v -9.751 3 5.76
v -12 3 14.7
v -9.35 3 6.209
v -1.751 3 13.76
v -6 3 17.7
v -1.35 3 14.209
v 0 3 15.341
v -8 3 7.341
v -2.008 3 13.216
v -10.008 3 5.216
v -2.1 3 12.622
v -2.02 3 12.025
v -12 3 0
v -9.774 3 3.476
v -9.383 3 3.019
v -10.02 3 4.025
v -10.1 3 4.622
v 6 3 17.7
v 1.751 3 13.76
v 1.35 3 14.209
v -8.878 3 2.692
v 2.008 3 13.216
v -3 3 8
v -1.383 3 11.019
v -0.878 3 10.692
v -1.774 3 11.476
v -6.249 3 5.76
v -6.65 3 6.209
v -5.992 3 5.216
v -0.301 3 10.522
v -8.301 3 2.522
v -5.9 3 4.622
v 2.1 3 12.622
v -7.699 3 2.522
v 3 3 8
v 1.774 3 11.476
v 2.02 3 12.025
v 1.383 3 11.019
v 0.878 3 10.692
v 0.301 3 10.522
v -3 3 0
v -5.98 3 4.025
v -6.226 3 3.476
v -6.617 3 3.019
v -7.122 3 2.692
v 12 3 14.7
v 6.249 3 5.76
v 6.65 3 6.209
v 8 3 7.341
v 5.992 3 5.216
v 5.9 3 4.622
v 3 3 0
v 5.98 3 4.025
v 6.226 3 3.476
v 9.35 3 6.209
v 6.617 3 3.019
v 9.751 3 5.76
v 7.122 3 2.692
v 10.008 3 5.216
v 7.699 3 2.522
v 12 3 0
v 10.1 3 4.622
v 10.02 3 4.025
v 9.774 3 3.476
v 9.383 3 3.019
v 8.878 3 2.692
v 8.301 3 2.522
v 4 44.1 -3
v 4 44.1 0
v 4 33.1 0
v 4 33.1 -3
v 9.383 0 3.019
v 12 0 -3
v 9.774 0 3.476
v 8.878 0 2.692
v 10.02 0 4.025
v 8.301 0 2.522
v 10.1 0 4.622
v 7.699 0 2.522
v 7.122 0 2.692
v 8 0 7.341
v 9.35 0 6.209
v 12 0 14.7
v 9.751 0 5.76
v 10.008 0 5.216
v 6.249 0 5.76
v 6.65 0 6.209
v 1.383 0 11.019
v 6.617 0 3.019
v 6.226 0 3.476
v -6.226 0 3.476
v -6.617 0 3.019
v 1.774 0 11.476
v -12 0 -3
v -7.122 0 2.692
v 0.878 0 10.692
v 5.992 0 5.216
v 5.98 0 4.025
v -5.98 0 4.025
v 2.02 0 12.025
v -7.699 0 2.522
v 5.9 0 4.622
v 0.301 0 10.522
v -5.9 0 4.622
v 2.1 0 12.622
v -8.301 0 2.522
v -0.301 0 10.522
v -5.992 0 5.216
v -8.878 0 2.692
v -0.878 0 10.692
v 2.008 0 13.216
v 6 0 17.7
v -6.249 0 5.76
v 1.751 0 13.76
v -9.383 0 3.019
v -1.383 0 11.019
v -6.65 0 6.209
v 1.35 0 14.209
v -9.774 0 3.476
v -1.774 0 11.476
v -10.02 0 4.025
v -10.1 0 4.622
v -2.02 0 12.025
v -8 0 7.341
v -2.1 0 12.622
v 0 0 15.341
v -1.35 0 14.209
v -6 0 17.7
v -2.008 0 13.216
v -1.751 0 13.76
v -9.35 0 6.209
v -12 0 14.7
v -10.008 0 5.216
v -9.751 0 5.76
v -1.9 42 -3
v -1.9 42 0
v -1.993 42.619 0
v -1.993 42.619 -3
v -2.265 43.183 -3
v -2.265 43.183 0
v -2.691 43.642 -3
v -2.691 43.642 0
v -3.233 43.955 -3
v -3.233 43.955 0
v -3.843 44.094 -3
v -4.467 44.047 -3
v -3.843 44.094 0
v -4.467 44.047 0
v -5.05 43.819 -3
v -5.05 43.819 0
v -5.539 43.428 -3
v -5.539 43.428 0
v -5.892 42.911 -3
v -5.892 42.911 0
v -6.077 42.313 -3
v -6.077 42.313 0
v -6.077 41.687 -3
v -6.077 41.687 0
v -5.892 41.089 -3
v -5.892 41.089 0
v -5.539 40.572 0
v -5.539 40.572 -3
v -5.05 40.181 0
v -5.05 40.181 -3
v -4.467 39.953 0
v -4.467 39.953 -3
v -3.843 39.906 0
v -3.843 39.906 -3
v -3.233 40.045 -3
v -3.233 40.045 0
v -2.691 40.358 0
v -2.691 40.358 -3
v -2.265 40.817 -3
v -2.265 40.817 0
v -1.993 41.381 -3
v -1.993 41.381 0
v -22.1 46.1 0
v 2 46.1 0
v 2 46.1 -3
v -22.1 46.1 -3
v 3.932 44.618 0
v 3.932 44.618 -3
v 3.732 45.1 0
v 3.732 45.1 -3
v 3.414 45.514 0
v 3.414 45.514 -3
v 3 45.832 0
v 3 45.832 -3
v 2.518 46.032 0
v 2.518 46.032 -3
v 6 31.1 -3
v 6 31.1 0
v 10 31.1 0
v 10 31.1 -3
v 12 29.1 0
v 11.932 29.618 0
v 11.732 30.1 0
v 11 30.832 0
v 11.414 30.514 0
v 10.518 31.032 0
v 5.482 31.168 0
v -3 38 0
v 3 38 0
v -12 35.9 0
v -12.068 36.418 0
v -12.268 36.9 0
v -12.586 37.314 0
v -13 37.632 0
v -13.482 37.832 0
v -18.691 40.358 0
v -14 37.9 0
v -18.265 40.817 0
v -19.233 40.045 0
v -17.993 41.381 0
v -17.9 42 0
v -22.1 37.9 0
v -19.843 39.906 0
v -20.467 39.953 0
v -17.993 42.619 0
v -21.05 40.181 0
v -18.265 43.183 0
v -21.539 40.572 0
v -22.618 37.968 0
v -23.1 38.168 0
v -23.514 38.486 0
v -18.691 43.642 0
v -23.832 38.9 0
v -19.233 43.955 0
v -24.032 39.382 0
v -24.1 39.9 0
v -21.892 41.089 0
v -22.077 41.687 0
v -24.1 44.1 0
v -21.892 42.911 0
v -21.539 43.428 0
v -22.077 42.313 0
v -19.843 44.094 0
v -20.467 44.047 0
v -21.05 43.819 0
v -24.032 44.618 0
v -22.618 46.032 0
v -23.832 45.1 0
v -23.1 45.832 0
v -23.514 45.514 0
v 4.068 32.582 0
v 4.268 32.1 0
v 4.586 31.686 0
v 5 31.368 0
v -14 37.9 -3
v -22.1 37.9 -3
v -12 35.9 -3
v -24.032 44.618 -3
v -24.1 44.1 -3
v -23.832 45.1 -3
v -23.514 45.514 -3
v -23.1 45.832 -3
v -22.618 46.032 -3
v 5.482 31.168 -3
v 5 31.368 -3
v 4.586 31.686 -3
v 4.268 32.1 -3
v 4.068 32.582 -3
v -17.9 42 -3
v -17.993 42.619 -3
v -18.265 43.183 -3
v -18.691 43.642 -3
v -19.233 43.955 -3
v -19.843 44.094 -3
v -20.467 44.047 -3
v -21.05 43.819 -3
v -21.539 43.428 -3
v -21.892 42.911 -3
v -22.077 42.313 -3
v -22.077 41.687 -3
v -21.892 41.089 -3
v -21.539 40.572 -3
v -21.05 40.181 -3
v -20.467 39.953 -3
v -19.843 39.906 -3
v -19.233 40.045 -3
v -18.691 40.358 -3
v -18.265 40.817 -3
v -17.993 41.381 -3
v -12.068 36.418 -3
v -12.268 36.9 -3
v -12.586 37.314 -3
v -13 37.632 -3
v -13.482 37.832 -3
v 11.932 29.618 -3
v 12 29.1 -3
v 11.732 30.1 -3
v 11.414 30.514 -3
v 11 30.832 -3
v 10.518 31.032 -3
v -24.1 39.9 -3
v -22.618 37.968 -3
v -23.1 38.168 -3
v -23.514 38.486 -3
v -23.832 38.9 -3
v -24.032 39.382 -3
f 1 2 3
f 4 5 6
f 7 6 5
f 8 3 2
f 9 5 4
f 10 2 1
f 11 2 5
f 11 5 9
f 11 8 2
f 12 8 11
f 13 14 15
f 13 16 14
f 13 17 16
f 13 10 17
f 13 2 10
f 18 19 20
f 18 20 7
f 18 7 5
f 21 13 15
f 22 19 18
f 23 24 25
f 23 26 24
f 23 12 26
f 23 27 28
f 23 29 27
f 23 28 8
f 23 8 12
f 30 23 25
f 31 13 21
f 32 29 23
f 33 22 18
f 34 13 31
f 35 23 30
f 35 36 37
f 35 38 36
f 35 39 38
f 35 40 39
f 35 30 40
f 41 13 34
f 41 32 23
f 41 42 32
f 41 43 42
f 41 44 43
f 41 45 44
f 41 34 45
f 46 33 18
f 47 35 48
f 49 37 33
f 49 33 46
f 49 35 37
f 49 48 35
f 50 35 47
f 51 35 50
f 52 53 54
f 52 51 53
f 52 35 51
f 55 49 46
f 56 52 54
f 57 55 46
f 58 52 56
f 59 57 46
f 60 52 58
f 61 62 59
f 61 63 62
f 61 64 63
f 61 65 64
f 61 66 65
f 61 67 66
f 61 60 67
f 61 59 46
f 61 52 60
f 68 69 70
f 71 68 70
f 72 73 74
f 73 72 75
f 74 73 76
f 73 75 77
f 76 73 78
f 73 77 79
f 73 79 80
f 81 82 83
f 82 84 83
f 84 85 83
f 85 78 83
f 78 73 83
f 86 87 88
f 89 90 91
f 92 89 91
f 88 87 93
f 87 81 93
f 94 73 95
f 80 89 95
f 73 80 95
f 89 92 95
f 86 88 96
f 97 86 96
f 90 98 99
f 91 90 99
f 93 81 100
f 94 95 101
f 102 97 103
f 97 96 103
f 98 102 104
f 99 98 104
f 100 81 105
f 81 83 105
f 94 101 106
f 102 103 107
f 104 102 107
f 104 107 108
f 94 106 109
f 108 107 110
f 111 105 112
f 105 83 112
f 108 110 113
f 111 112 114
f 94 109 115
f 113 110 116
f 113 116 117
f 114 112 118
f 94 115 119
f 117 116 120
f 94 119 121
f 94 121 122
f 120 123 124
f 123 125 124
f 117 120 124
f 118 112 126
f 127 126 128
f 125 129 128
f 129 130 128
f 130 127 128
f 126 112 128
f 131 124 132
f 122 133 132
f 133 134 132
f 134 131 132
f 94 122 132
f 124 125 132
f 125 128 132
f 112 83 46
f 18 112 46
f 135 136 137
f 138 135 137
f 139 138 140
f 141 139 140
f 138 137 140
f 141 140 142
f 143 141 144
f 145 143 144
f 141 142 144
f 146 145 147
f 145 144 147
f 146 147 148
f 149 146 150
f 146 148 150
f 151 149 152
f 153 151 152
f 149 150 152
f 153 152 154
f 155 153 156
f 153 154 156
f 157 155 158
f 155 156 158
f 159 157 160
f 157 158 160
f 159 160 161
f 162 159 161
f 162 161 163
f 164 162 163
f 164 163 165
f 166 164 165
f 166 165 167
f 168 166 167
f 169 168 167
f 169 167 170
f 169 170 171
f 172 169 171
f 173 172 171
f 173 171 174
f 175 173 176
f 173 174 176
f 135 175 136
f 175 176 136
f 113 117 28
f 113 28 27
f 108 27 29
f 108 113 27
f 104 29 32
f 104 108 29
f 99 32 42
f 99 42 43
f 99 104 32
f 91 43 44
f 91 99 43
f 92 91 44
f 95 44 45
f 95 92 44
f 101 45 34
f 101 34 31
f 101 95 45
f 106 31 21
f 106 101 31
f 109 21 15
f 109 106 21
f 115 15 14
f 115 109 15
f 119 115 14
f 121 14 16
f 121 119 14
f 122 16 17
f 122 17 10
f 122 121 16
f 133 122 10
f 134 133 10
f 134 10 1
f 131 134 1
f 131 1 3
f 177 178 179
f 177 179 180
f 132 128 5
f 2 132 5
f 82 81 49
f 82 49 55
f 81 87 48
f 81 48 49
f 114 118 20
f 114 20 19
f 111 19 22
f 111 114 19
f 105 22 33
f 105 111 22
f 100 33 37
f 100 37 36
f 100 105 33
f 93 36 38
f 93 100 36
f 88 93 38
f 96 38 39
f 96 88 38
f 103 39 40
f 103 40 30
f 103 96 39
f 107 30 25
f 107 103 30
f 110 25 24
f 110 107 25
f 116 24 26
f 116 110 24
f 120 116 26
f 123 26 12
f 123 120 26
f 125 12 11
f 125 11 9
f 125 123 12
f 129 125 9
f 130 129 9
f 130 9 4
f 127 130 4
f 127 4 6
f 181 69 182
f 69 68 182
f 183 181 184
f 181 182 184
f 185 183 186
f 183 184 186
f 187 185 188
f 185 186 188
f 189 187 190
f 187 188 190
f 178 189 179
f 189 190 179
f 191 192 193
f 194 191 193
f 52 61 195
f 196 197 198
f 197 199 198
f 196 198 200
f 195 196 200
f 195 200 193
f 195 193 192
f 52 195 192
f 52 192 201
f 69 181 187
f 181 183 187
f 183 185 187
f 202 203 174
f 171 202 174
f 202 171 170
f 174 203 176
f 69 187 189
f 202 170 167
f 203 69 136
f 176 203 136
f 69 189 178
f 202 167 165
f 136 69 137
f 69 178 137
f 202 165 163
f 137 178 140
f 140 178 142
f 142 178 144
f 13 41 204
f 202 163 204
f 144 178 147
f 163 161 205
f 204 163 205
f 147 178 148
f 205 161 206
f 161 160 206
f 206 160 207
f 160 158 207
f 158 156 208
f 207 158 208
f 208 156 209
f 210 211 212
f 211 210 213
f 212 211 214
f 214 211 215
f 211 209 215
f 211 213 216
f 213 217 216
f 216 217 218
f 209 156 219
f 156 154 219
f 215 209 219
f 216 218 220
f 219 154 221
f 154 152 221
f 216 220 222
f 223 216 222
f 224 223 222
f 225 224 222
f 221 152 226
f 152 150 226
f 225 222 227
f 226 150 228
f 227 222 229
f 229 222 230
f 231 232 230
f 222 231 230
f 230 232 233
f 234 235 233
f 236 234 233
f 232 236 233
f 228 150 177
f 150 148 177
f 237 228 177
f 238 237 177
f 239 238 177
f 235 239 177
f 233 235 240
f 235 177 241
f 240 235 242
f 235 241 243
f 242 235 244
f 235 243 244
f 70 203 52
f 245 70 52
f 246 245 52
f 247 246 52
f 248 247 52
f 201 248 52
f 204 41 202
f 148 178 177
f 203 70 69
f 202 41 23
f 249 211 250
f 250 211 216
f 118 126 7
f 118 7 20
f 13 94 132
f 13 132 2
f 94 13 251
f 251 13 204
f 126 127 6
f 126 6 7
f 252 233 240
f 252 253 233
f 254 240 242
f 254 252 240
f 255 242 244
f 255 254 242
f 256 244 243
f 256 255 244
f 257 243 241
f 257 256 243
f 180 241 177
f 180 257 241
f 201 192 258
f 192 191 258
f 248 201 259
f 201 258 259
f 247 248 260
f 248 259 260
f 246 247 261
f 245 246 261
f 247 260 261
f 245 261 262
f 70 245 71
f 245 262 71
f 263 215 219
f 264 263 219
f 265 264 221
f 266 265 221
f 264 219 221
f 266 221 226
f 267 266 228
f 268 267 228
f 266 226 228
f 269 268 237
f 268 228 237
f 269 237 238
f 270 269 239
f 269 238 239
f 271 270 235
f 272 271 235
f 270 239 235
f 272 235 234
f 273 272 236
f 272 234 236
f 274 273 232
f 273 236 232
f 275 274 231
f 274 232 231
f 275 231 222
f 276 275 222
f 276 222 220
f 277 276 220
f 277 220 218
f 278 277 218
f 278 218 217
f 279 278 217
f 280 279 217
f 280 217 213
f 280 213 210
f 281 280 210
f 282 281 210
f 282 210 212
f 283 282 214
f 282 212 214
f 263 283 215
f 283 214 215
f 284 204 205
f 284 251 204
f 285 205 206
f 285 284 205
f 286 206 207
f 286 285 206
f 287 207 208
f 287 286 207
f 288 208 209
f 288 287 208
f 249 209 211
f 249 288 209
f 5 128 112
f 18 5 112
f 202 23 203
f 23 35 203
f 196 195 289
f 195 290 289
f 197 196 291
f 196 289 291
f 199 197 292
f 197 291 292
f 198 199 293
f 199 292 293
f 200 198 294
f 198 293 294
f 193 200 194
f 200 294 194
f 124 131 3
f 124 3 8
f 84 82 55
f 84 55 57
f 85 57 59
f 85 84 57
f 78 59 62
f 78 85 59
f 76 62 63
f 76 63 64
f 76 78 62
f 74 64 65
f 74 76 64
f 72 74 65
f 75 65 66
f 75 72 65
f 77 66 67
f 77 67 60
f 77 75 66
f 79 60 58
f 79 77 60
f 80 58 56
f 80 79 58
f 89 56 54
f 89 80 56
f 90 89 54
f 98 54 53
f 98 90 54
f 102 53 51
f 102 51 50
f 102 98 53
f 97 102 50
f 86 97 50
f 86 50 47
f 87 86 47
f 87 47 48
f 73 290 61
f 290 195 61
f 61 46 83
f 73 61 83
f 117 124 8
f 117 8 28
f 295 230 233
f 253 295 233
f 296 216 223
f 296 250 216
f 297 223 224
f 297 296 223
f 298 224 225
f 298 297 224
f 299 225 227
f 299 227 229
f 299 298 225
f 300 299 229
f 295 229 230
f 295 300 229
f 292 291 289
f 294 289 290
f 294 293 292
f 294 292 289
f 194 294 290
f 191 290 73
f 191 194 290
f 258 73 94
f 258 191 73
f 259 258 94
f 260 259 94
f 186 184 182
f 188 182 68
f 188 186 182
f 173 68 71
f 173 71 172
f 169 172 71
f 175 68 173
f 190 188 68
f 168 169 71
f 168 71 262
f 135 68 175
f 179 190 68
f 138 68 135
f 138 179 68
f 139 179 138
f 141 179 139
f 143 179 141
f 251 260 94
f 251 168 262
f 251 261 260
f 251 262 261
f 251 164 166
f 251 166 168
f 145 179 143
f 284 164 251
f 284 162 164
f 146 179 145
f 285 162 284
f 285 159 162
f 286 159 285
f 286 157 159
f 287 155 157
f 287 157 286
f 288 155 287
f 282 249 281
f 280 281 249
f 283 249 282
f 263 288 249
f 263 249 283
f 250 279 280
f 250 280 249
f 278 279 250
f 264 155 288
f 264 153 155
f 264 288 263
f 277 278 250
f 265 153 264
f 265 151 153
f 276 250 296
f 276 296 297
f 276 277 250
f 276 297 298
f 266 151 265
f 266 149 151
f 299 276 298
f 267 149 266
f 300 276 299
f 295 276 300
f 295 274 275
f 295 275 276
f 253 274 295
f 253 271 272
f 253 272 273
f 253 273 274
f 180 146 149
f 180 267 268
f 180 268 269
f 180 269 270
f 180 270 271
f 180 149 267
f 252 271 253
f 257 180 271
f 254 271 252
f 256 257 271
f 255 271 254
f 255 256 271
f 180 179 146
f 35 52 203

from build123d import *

# Parameters (mm, degrees)
SKETCH1_W           = 24
SKETCH1_H           = 17.7
BOSS_EXTRUDE1_DEPTH = 3
SKETCH2_R           = 2.1
BOSS_EXTRUDE2_DEPTH = 3
BOSS_EXTRUDE3_DEPTH = 3
CHAMFER1_SIZE       = 6
CHAMFER1_SIZE2      = 3
CHAMFER2_SIZE       = 3
CHAMFER2_SIZE2      = 6
FILLET1_R           = 2


with BuildPart() as part:
    # Sketch1 → Boss-Extrude1 (new body)
    with BuildSketch(Plane(origin=(0, 0, 0), x_dir=(1, 0, 0), z_dir=(0, 1, 0))):
        with Locations((0, -8.85)):
            Rectangle(SKETCH1_W, SKETCH1_H)
        with BuildLine():
            Line((-9.34985398, -6.208693331), (-8, -7.341355308))
            Line((-8, -7.341355308), (-6.65014602, -6.208693331))
            ThreePointArc((-6.65014602, -6.208693331), (-8, -2.5), (-9.34985398, -6.208693331))
        make_face(mode=Mode.SUBTRACT)
        with BuildLine():
            Line((6.65014602, -6.208693331), (8, -7.341355308))
            Line((8, -7.341355308), (9.34985398, -6.208693331))
            ThreePointArc((9.34985398, -6.208693331), (8, -2.5), (6.65014602, -6.208693331))
        make_face(mode=Mode.SUBTRACT)
        with BuildLine():
            Line((-1.34985398, -14.208693331), (0, -15.341355308))
            Line((0, -15.341355308), (1.34985398, -14.208693331))
            ThreePointArc((1.34985398, -14.208693331), (0, -10.5), (-1.34985398, -14.208693331))
        make_face(mode=Mode.SUBTRACT)
    extrude(amount=BOSS_EXTRUDE1_DEPTH)

    # Sketch2 → Boss-Extrude2 (add)
    with BuildSketch(Plane.XY):
        Polygon((12, 0), (-12, 0), (-12, 37.9), (-24.1, 37.9), (-24.1, 46.1), (-12, 46.1), (4, 46.1), (4, 31.1), (12, 31.1), align=None)
        with Locations((-20, 42)):
            Circle(SKETCH2_R, mode=Mode.SUBTRACT)
        with Locations((-4, 42)):
            Circle(SKETCH2_R, mode=Mode.SUBTRACT)
    extrude(amount=-BOSS_EXTRUDE2_DEPTH)

    # Sketch3 → Boss-Extrude3 (add, symmetric)
    with BuildSketch(Plane(origin=(0, 0, 0), x_dir=(0, 0, -1), z_dir=(1, 0, 0))):
        Polygon((0, 3), (-8, 3), (0, 38), align=None)
    extrude(amount=BOSS_EXTRUDE3_DEPTH, both=True)

    # Chamfer1
    chamfer1_edges = [part.edges().sort_by_distance(p)[0] for p in [
        (12, 1.5, 17.7),
    ]]
    chamfer1_side = [part.faces().sort_by_distance(p)[0] for p in [
        (0, 1.5, 17.7),
    ]]
    chamfer(chamfer1_edges, length=CHAMFER1_SIZE, length2=CHAMFER1_SIZE2, reference=chamfer1_side[0])

    # Chamfer2
    chamfer2_edges = [part.edges().sort_by_distance(p)[0] for p in [
        (-12, 1.5, 17.7),
    ]]
    chamfer2_side = [part.faces().sort_by_distance(p)[0] for p in [
        (-12, 1.5, 17.26815512),
    ]]
    chamfer(chamfer2_edges, length=CHAMFER2_SIZE, length2=CHAMFER2_SIZE2, reference=chamfer2_side[0])

    # Fillet1
    fillet1_edges = [part.edges().sort_by_distance(p)[0] for p in [
        (12, 31.1, -1.5),
        (-12, 37.9, -1.5),
        (-24.1, 37.9, -1.5),
        (-24.1, 46.1, -1.5),
        (4, 46.1, -1.5),
        (4, 31.1, -1.5),
    ]]
    fillet(fillet1_edges, radius=FILLET1_R)


solid = part.part
